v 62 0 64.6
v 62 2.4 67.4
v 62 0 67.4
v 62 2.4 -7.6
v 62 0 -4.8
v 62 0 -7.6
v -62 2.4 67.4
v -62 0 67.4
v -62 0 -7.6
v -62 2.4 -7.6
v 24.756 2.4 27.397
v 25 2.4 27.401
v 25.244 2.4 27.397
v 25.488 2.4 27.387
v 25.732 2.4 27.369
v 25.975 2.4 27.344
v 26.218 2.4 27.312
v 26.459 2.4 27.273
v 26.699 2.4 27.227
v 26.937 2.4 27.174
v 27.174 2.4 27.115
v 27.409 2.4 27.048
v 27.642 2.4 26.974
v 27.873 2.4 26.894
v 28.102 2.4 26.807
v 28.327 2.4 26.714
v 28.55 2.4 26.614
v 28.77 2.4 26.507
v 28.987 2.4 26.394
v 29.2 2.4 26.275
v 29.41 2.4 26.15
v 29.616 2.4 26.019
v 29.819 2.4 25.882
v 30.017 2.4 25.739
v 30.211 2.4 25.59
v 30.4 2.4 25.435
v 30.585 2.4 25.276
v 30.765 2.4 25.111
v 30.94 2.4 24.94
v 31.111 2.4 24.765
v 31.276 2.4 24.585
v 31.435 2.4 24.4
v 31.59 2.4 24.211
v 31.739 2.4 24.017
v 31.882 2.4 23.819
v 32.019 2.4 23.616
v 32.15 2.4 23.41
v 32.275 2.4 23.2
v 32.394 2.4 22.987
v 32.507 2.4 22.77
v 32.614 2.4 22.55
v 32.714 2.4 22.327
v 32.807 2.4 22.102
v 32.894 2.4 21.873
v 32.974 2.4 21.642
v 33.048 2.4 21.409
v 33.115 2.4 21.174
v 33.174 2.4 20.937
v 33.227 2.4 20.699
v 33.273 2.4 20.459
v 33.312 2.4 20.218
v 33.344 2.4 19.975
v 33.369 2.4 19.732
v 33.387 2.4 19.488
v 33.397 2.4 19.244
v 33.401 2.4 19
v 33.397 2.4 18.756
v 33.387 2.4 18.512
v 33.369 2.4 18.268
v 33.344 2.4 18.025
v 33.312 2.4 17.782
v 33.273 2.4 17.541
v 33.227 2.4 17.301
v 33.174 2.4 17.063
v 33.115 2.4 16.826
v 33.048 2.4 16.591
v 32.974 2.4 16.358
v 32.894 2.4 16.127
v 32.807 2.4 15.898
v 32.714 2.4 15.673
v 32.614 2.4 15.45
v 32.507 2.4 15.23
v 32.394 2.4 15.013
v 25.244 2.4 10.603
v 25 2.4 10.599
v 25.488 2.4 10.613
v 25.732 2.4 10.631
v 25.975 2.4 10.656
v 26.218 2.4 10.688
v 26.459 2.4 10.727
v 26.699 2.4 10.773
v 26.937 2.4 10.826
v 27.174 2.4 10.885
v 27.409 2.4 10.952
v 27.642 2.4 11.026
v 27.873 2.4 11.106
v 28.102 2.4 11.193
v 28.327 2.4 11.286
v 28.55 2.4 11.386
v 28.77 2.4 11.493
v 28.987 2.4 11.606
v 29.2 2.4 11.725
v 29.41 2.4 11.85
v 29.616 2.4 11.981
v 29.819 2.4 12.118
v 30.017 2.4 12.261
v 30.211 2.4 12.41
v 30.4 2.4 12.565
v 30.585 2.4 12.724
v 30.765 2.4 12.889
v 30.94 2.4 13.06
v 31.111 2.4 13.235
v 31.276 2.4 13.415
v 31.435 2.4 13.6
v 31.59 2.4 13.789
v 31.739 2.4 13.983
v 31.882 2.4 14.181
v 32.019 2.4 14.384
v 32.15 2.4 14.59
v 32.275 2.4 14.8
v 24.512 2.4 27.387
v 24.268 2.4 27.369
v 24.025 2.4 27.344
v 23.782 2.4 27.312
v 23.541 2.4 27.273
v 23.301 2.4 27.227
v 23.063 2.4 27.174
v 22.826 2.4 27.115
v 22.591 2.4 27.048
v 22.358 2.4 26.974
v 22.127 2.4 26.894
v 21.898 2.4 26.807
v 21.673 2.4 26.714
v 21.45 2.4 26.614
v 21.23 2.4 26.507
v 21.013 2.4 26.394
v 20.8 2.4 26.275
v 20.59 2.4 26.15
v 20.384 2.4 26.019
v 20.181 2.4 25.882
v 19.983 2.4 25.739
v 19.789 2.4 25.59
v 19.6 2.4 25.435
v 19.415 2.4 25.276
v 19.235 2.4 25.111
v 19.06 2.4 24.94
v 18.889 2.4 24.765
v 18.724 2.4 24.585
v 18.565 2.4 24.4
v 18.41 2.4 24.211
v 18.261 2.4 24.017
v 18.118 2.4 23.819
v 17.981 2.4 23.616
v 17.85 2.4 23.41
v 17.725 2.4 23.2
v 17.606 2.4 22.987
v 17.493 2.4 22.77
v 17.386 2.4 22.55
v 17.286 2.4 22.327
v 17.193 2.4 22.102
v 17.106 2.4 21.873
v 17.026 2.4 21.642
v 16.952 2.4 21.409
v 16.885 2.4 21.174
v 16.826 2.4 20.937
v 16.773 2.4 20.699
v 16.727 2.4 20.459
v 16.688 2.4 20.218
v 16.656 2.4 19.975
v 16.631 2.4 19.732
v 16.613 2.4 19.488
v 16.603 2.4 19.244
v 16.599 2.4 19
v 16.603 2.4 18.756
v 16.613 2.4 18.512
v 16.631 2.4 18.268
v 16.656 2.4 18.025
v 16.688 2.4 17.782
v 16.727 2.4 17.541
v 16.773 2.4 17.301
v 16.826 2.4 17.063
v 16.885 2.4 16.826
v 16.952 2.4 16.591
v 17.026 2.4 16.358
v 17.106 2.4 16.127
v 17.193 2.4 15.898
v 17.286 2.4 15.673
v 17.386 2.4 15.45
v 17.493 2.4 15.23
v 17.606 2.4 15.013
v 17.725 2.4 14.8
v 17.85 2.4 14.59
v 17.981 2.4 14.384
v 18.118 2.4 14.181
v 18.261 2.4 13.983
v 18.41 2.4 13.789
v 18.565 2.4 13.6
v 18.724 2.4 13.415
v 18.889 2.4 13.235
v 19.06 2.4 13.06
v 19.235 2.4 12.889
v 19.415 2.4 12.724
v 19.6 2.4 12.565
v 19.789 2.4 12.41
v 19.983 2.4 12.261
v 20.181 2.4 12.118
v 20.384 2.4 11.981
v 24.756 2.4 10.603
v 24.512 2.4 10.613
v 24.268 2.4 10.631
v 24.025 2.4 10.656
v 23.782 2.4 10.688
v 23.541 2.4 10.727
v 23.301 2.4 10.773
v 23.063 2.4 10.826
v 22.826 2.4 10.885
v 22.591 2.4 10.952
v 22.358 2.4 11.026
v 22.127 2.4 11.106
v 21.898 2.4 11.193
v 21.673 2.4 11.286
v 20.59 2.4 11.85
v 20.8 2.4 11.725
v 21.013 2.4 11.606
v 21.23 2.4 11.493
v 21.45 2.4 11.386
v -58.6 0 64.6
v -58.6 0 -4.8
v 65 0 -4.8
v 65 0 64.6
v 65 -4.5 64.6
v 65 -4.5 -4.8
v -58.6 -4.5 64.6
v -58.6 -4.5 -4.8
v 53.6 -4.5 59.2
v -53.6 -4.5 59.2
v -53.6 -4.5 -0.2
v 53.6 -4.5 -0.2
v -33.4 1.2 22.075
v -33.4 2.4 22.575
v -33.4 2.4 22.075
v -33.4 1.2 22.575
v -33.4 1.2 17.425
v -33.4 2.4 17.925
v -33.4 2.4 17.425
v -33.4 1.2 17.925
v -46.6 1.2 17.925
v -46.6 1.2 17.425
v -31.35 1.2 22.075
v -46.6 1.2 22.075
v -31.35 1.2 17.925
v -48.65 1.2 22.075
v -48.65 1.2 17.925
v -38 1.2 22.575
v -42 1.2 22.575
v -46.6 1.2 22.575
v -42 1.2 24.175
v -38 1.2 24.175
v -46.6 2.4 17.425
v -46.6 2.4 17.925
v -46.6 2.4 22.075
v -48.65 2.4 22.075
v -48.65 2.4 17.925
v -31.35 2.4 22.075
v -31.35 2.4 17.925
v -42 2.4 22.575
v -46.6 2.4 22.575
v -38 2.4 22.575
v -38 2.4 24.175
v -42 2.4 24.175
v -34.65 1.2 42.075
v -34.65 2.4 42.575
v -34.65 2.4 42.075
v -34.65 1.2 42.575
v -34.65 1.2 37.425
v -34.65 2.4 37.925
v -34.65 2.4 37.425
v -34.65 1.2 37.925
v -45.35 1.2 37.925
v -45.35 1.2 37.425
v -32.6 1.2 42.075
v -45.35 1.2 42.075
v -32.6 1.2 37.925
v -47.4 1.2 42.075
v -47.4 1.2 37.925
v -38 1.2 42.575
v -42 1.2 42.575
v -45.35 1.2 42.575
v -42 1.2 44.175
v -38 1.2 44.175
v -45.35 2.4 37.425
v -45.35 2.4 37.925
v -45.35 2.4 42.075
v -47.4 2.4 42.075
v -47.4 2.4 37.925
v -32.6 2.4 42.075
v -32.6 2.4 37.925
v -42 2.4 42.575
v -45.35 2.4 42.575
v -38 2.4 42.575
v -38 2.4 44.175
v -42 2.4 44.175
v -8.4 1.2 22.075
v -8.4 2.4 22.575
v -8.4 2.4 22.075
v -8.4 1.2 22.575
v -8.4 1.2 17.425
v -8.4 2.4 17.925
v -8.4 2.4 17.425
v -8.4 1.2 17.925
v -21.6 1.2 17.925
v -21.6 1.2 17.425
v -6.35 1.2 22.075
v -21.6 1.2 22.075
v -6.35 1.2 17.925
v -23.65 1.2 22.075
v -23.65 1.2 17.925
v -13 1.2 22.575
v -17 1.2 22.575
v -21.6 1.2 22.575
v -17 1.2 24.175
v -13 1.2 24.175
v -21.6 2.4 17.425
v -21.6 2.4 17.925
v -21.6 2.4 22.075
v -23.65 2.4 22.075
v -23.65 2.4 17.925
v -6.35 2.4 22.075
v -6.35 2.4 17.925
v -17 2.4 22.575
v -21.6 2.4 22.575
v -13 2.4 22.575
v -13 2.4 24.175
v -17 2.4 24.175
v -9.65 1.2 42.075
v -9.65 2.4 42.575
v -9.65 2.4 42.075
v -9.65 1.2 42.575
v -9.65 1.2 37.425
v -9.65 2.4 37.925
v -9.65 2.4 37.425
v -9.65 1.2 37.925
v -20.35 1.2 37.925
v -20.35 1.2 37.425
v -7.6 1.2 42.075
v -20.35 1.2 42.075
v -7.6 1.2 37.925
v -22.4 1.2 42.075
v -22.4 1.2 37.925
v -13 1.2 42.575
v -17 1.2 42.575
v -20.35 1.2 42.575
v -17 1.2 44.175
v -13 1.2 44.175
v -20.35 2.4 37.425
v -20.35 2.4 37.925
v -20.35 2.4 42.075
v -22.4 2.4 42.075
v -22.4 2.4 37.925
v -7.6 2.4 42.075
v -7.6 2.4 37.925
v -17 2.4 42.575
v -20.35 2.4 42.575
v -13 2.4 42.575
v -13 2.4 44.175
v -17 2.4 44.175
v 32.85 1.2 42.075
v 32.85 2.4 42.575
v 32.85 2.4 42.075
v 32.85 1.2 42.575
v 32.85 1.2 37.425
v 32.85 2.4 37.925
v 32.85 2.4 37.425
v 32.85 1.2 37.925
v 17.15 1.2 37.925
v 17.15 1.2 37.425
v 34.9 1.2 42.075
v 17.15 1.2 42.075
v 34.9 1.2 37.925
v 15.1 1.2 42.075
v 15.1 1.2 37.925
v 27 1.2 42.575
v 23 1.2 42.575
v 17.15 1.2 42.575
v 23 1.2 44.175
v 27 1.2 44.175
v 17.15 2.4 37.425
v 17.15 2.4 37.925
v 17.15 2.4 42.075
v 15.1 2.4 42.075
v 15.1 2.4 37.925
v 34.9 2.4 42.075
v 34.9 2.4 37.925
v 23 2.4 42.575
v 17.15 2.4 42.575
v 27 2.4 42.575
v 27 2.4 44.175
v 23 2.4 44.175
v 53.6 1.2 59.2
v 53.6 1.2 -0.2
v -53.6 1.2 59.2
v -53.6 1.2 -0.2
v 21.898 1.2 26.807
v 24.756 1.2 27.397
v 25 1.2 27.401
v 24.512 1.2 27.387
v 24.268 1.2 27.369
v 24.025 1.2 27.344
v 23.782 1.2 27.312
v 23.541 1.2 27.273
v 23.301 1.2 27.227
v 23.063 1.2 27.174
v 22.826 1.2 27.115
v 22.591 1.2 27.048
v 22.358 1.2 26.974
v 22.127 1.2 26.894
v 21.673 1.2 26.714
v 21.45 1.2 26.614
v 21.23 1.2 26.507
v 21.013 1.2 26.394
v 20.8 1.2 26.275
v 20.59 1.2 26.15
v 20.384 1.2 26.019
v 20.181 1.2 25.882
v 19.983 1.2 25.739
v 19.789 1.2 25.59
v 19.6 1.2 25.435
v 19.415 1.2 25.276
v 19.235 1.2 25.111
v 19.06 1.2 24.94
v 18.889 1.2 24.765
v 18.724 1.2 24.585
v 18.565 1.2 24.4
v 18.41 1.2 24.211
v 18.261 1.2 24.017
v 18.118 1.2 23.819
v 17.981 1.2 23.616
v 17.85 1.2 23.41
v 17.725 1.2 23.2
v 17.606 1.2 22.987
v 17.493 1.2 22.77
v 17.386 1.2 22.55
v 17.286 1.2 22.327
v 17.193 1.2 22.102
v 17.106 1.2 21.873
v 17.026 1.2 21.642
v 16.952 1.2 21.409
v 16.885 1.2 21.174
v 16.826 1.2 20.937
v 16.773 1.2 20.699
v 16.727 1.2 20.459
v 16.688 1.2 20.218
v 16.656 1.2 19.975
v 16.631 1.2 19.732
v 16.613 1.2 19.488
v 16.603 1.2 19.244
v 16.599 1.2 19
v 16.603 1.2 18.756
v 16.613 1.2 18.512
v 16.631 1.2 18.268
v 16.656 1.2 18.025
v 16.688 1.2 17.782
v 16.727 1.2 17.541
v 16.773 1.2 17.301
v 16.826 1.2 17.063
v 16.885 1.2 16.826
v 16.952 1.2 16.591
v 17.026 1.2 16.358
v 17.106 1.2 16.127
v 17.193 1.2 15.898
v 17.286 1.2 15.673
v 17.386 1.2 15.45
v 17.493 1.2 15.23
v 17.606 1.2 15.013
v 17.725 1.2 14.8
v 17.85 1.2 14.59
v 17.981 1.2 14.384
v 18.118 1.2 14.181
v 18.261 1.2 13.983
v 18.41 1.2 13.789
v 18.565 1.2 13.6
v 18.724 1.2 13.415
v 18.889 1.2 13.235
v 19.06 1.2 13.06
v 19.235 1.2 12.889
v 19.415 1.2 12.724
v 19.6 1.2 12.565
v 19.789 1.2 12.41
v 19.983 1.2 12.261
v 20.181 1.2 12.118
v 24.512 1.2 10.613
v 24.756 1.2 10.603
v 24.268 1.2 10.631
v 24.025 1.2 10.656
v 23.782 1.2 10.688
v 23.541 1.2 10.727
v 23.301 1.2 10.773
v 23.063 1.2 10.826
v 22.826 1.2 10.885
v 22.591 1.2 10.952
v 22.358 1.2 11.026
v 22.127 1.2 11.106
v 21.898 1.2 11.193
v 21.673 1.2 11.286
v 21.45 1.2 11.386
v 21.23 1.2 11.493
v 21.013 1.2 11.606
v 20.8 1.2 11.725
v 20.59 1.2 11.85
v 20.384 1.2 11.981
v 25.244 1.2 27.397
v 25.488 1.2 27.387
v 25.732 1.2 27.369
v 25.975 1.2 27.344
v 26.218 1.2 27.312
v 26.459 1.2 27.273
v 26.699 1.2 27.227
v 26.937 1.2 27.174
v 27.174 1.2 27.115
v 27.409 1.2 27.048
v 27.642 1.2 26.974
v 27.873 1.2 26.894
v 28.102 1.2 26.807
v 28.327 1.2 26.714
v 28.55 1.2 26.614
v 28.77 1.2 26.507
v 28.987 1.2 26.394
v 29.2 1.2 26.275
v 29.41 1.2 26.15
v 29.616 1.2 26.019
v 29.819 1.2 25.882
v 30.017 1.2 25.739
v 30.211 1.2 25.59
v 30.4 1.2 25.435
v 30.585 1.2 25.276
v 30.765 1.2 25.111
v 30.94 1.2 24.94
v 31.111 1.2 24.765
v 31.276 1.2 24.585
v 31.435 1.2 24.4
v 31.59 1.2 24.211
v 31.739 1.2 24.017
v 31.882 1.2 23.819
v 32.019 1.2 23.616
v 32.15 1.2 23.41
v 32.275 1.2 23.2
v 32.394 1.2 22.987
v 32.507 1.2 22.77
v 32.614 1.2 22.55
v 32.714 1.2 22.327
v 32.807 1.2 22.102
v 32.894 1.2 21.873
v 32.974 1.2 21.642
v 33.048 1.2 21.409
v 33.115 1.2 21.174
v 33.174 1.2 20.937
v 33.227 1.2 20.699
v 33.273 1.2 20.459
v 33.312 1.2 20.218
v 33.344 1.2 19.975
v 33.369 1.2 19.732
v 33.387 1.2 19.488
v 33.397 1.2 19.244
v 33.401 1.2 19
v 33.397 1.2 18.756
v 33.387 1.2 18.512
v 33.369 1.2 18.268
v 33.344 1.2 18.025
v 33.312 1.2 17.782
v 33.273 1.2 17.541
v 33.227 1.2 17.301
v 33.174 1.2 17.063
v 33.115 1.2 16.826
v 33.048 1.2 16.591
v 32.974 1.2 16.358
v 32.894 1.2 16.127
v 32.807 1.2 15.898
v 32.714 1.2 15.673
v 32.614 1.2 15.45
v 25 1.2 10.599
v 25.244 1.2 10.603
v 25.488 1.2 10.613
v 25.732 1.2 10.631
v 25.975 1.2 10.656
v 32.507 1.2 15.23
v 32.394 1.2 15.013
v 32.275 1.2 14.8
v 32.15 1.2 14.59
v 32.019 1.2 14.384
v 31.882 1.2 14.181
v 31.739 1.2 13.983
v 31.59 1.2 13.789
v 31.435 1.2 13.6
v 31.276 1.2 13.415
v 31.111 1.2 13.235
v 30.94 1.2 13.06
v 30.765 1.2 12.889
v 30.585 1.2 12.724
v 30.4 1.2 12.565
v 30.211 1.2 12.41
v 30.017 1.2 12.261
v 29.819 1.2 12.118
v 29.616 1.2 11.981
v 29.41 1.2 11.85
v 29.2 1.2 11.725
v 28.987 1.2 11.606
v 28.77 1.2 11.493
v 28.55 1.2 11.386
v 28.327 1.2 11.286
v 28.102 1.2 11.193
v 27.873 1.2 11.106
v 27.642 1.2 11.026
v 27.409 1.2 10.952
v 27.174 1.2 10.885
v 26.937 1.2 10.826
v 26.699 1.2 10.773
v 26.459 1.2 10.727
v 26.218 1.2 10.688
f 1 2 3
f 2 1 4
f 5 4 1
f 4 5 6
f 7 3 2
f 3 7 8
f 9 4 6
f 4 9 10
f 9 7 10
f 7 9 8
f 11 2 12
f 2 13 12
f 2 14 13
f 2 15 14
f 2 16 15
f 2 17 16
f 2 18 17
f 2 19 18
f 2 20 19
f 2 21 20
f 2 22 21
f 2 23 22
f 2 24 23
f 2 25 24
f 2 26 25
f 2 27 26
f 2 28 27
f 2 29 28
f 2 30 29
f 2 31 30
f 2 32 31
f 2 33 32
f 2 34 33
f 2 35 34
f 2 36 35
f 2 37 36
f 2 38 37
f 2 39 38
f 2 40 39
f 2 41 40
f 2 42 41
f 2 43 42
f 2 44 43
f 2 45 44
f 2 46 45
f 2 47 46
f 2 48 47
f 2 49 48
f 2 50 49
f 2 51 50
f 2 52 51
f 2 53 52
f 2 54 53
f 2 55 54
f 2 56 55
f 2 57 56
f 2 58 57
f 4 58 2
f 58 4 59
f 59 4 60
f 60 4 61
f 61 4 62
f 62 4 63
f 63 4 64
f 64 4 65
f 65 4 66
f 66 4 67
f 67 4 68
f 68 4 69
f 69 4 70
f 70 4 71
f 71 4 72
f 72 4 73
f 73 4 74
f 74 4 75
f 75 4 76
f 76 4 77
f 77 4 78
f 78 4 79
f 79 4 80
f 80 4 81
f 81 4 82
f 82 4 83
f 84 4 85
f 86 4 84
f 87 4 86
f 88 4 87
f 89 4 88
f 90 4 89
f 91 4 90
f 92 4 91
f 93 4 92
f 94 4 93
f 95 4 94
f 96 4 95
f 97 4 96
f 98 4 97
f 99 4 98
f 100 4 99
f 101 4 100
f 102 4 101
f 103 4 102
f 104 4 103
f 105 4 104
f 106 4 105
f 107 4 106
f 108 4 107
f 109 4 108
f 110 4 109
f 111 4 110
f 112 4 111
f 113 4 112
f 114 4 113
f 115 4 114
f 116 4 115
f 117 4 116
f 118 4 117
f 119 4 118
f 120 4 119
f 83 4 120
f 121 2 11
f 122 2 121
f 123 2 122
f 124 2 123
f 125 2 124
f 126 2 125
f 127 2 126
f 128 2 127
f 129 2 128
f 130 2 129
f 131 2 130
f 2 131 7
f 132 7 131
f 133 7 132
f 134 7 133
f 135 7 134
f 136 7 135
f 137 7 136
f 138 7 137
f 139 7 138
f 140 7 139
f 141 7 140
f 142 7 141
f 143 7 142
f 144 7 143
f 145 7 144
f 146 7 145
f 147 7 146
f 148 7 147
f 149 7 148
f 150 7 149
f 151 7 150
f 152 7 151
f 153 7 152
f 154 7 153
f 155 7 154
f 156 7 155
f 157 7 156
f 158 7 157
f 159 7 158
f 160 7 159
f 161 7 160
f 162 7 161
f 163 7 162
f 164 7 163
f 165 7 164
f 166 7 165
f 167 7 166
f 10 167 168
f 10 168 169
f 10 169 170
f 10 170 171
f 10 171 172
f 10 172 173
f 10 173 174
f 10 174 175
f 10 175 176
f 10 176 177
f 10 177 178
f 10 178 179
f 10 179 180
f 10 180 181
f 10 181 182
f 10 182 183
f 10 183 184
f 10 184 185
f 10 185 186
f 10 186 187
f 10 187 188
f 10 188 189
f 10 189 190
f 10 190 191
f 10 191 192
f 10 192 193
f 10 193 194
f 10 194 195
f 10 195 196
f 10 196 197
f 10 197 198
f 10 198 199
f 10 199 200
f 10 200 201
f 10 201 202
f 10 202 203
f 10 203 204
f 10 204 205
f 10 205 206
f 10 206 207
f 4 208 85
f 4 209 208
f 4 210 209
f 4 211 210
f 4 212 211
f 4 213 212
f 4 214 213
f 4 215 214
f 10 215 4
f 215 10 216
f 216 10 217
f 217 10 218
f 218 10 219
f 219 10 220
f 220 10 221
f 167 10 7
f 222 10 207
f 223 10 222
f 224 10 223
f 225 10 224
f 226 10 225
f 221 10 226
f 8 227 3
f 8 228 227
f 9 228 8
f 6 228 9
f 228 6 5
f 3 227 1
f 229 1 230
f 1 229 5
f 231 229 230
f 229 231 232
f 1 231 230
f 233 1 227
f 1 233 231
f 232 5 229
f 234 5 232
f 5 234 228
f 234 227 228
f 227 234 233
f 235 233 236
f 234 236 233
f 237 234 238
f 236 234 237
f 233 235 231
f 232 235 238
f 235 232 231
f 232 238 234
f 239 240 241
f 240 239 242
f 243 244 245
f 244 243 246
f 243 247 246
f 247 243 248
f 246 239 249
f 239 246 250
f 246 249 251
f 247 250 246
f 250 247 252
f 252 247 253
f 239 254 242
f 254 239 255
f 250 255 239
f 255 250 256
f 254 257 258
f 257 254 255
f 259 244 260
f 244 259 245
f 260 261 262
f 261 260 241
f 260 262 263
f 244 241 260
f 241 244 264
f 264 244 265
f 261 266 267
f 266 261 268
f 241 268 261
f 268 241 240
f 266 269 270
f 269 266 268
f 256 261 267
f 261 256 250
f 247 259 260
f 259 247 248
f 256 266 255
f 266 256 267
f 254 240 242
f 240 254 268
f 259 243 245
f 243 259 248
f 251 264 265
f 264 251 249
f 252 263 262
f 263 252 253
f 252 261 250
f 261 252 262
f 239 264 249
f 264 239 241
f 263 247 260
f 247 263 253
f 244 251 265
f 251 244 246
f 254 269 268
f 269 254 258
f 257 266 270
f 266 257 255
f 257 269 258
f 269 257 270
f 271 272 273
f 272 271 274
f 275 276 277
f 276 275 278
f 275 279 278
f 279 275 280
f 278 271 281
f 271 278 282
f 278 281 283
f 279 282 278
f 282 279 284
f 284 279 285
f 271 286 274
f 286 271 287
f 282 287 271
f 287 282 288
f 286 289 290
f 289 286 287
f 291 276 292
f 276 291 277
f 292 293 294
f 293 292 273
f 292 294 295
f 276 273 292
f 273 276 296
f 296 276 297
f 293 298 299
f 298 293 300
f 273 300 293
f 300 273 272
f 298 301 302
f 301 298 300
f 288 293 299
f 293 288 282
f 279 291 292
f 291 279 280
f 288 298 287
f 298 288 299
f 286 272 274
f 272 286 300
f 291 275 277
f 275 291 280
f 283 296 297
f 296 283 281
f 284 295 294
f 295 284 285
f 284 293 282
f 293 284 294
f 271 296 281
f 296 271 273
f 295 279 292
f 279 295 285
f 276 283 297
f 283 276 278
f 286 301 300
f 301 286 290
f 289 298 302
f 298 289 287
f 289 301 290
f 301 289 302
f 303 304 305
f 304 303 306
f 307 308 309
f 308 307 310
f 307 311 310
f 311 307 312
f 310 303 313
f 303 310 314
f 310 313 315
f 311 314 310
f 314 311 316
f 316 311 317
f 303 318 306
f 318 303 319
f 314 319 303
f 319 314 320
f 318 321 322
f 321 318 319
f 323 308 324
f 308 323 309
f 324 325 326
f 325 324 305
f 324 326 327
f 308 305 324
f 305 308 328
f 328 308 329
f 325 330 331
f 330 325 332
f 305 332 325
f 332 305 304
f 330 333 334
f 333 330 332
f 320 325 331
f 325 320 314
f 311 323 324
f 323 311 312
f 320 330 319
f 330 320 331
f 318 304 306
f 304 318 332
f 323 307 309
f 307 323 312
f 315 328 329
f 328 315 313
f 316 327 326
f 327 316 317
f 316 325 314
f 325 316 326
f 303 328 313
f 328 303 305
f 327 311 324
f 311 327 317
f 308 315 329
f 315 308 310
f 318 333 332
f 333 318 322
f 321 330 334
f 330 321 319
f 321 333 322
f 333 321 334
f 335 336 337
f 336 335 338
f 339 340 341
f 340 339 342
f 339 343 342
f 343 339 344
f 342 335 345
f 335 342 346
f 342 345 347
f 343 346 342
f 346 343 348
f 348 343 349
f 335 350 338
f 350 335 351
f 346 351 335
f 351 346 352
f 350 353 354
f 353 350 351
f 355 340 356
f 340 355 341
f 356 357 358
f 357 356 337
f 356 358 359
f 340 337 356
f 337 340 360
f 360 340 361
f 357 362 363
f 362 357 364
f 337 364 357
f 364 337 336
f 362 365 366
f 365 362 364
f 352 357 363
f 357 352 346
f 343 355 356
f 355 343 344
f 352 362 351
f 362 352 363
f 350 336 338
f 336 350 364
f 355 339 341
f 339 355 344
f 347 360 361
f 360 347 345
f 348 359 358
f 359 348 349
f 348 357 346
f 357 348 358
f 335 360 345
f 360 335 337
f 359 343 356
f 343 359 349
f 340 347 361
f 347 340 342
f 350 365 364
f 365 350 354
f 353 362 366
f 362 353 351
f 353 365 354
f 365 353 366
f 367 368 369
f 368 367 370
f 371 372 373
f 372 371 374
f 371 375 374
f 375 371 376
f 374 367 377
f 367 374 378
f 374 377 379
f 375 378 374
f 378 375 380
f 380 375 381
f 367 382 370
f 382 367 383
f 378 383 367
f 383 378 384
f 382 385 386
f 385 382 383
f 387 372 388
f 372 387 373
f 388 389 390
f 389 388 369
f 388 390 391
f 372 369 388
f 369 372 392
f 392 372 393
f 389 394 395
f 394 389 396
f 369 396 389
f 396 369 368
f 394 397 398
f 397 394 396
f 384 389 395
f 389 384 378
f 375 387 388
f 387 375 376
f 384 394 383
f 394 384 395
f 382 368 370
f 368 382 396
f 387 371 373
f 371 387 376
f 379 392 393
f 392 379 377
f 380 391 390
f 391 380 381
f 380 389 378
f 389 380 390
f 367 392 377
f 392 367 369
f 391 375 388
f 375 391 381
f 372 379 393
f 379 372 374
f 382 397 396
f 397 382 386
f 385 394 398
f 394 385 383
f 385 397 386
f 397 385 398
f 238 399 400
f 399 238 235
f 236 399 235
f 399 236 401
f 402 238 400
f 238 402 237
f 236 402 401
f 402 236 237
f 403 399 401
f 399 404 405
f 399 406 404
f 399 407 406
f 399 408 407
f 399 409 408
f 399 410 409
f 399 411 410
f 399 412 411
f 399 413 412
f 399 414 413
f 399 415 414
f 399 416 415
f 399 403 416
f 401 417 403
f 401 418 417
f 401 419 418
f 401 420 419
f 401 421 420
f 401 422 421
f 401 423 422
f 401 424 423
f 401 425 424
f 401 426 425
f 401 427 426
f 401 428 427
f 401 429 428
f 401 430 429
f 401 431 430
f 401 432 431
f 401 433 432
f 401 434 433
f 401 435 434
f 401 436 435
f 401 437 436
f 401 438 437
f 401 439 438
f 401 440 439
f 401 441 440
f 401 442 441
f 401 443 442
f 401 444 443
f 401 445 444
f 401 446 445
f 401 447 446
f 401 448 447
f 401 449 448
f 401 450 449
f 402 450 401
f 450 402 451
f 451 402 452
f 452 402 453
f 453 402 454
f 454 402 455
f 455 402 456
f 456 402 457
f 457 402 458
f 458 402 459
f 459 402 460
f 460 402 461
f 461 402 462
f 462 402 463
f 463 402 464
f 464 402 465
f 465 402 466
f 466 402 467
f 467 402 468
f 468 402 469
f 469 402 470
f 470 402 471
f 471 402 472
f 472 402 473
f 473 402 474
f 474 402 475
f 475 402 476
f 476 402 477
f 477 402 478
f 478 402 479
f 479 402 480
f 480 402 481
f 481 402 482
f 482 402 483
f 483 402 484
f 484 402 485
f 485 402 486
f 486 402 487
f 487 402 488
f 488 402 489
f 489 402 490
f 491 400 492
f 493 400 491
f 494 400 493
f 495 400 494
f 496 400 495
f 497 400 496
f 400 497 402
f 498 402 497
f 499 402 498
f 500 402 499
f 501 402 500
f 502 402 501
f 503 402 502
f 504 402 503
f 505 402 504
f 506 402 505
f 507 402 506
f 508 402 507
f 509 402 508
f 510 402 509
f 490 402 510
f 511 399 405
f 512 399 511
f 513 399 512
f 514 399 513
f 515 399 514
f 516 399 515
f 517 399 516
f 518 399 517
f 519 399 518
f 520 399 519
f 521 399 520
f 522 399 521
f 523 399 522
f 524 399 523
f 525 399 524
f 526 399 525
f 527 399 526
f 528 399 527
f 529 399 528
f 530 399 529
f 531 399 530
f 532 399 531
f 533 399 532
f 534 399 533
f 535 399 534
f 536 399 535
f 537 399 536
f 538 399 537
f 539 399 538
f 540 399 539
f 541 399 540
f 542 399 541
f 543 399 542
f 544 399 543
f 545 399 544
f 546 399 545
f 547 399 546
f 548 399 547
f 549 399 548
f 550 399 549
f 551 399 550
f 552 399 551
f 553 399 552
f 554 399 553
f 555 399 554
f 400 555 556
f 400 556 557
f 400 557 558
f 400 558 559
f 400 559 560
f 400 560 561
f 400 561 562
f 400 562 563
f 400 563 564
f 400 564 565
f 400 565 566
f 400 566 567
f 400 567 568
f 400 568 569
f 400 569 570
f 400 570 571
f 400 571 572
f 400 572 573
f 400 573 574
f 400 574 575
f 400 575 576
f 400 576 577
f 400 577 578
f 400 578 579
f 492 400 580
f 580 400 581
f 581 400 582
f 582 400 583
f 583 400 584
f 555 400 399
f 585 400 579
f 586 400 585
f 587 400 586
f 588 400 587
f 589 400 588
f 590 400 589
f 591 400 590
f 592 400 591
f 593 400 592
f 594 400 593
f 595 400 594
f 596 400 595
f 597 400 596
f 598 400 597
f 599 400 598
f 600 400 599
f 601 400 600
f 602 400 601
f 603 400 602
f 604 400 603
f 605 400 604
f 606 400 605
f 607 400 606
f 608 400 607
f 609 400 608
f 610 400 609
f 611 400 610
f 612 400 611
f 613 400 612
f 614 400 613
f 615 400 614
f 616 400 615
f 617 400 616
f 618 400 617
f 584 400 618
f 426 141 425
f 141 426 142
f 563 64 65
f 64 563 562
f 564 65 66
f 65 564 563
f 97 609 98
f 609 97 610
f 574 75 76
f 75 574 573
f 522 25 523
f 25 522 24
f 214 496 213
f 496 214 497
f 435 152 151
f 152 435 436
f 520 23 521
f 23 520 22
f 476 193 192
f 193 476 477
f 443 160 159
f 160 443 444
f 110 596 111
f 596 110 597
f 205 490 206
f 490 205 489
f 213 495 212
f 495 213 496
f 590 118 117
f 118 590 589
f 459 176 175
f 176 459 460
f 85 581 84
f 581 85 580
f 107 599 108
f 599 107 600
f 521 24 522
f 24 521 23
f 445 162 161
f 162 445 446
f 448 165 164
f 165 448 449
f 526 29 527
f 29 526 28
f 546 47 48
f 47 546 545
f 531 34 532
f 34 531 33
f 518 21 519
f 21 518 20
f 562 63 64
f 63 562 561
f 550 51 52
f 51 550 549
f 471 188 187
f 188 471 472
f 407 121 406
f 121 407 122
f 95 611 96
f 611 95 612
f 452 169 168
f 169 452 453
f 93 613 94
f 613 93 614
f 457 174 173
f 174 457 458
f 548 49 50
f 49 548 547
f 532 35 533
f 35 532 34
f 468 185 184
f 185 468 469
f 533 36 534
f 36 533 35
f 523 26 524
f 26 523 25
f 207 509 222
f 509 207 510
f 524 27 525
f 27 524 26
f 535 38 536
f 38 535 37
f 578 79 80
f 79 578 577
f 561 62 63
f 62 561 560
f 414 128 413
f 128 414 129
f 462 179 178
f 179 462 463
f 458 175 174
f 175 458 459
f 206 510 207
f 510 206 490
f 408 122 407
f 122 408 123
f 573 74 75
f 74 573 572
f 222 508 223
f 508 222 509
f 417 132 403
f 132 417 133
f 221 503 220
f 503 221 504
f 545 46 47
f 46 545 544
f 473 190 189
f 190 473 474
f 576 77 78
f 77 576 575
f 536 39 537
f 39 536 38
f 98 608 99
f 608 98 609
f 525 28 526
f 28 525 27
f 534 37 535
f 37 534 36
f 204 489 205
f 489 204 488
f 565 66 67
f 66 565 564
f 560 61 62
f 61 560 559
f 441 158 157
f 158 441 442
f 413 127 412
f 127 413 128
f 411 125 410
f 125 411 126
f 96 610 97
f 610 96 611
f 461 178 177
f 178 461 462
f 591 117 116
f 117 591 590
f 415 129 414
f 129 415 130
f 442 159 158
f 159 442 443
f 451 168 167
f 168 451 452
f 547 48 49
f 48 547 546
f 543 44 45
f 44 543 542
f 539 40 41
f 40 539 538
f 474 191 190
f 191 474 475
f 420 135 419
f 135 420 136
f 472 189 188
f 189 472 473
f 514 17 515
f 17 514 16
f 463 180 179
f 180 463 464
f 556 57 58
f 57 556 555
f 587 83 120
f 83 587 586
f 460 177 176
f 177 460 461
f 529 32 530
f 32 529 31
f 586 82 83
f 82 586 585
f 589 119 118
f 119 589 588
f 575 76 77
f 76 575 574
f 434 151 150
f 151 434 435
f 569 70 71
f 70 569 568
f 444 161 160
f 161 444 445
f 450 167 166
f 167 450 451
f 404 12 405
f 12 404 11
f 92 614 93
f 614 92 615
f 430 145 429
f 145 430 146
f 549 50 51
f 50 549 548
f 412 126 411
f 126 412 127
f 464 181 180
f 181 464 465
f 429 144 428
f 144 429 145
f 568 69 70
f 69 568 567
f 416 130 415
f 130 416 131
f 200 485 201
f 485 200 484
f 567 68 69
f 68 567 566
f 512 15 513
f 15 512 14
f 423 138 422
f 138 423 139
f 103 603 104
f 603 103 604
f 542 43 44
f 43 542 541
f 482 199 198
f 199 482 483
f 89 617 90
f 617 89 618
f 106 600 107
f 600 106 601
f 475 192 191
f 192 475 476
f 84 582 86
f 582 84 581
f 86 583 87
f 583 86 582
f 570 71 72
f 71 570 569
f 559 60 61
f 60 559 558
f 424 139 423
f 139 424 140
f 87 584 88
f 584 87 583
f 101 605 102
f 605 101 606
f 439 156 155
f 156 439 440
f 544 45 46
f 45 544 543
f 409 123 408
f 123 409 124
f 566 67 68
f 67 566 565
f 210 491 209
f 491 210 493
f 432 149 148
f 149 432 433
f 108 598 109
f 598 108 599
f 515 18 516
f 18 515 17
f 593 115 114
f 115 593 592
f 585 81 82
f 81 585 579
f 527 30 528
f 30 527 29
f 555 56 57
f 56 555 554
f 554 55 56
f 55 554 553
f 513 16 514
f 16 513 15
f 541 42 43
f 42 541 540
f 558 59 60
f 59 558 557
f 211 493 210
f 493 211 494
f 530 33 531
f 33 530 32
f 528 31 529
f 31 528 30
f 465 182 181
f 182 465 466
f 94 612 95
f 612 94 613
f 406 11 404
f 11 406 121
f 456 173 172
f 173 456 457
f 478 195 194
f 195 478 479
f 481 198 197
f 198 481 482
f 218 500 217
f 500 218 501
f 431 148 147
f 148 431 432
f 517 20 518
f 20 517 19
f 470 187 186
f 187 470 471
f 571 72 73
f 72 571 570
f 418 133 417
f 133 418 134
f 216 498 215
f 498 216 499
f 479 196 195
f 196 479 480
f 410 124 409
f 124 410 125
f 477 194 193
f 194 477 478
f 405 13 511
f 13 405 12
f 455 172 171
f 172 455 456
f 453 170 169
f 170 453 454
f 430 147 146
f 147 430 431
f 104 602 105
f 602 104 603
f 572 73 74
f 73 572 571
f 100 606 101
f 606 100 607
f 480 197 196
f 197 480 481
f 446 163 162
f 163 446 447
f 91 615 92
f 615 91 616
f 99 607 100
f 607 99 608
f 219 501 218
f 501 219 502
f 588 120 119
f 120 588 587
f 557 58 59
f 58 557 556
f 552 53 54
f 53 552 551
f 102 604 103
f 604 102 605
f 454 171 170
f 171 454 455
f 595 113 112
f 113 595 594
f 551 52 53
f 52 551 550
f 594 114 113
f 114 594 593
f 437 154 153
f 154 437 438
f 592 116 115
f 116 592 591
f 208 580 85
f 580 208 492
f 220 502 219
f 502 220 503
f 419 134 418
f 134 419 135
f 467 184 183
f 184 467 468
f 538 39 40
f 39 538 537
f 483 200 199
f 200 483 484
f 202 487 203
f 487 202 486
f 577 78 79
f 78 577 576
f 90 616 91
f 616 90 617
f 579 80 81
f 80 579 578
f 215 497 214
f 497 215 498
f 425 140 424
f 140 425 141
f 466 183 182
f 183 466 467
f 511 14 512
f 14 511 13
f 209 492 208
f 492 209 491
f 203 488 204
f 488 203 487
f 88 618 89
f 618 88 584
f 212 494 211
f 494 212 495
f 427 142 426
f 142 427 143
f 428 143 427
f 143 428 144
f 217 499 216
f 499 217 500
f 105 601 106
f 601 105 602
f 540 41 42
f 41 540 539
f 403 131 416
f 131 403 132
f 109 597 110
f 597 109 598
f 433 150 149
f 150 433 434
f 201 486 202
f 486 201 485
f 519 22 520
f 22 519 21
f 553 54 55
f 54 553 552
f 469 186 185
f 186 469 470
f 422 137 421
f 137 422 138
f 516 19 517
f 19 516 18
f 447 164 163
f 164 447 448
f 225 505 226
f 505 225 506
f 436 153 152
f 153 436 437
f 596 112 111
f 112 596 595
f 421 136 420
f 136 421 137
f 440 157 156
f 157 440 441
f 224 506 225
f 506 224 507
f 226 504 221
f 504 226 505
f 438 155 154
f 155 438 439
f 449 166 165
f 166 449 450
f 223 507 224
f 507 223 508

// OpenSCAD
// file: common.scad
fn=72*3;
$fn=fn;

de_minimus=0.01;
clearance_loose=0.4;
clearance_tight=0.2;
corner_rad=3;
tran_wedge_x_tran=3.4;
tran_wedge_y_tran=2.8;

// 248 top/bottom
// 250 flare in middle

transition_wedge_dim=[
    248/2,
    2.4,
    75
];

ext_transition_dim=[
    transition_wedge_dim.x - tran_wedge_x_tran * 2,
    4.5,
    transition_wedge_dim.z - tran_wedge_y_tran * 2
];

ext_transition_tran=[
    0,
    - ext_transition_dim.y / 2,
    ext_transition_dim.z / 2 + tran_wedge_y_tran
];

transition_wedge_tran=[
    0,
    transition_wedge_dim.y / 2,
    transition_wedge_dim.z / 2
];

faceplate_pillar_tran=[
    0,
    0,
    -7.6
];

module cylinder_outer(height,radius,center=false, fn=fn){
    fudge = 1/cos(180/fn);
    cylinder(h=height,r=radius*fudge, center=center);
}

module doughnut(height,outer_radius,inner_radius,center=true, fn=fn){
    difference() {
        cylinder_outer(height,outer_radius,center=center);
        cylinder_outer(height,inner_radius,center=center);
    }
}

module multiHull(){
    for (i = [1 : $children-1]) {
        hull(){
            children(0);
            children(i);
        }
    }
}

module BlankFacePlate(overlap=false) {
    overlap_adj_x = overlap ?
        tran_wedge_x_tran * 2 - clearance_loose:
        0;

    translate(faceplate_pillar_tran) {
        translate(transition_wedge_tran) cube(transition_wedge_dim, center=true);
        translate([
            ext_transition_tran.x + (overlap_adj_x / 2),
            ext_transition_tran.y,
            ext_transition_tran.z
        ]) cube([
            ext_transition_dim.x + overlap_adj_x,
            ext_transition_dim.y,
            ext_transition_dim.z
        ], center=true);
    }
}
// main file
include <common.scad>

module JSTSMPanelCutout(circuits=2, panel_thickness=1.4, clearance=0, thickness_clearance=0) {
    // https://cdn-shop.adafruit.com/datasheets/JSTSM.pdf
    // indexed by circuit count starting at 0
    assert(circuits >= 2 && circuits <= 12);
    b_start_measure = panel_thickness < 1.0 ? 9.6 :
        panel_thickness > 1.5 ? 10 : 9.8;

    a_measure = 5.7 + (circuits - 2) * 2.5;
    b_measure = b_start_measure + (circuits - 2) * 2.5;
    thickness = panel_thickness + thickness_clearance;
    2clearance = clearance * 2;

    a_cube_dim = [
        a_measure + 2clearance,
        5.15 + 2clearance,
        thickness,
    ];

    b_cube_dim = [
        b_measure + 2clearance,
        4.15 + 2clearance,
        thickness,
    ];

    notch_cube_dim = [
        4.0 + 2clearance,
        5.15 + 1.6 + 2clearance,
        thickness
    ];

    cube(a_cube_dim, center=true);
    cube(b_cube_dim, center=true);
    translate([0,1.6/2,0]) cube(notch_cube_dim, center=true);
}

difference() {
    BlankFacePlate(true);
    panel_thickness=1.2;
    additional_padding=2-panel_thickness;
    foo_y=0.40;
    translate([
        ext_transition_tran.x,
        ext_transition_tran.y + foo_y,
        ext_transition_tran.z - 8,
    ]) cube([
        ext_transition_dim.x-10,
        ext_transition_dim.y + (additional_padding * 2),
        ext_transition_dim.z-10
    ], center=true);

    top_level_z_tran=20;

    translate([
        0,
        additional_padding + panel_thickness / 2 + foo_y,
        15
    ]) {
       translate([
            -40,
            0,
            5
        ]) {
            rotate([90,0,0]) JSTSMPanelCutout(5, panel_thickness=panel_thickness);
            translate([0,0,top_level_z_tran]) rotate([90,0,0]) JSTSMPanelCutout(4, panel_thickness=panel_thickness);

            translate([
                25,
                0,
                0
            ]) {
                translate([0,0,0]) rotate([90,0,0]) JSTSMPanelCutout(5, panel_thickness=panel_thickness);
                translate([0,0,top_level_z_tran]) rotate([90,0,0]) JSTSMPanelCutout(4, panel_thickness=panel_thickness);
            }
        }

        translate([
            25,
            0,
            10
        ]) {
            translate([0,0,15]) rotate([90,0,0]) JSTSMPanelCutout(6, panel_thickness=panel_thickness);
        }
    }

    // power
    // select https://www.bunnings.com.au/epa-16mm-nylon-cable-gland_p4420402
    translate([
        25,
        additional_padding + panel_thickness + foo_y,
        19
    ]) {
        rotate([90,0,0]) cylinder_outer(panel_thickness, (16/2) + clearance_loose);
    }

    // fan switch
    // translate([
    //     -28,
    //     additional_padding + panel_thickness,
    //     45
    // ]) {
    //     rotate([90,0,0]) cylinder_outer(panel_thickness, (4.72/2) + clearance_loose);
    // }
}
